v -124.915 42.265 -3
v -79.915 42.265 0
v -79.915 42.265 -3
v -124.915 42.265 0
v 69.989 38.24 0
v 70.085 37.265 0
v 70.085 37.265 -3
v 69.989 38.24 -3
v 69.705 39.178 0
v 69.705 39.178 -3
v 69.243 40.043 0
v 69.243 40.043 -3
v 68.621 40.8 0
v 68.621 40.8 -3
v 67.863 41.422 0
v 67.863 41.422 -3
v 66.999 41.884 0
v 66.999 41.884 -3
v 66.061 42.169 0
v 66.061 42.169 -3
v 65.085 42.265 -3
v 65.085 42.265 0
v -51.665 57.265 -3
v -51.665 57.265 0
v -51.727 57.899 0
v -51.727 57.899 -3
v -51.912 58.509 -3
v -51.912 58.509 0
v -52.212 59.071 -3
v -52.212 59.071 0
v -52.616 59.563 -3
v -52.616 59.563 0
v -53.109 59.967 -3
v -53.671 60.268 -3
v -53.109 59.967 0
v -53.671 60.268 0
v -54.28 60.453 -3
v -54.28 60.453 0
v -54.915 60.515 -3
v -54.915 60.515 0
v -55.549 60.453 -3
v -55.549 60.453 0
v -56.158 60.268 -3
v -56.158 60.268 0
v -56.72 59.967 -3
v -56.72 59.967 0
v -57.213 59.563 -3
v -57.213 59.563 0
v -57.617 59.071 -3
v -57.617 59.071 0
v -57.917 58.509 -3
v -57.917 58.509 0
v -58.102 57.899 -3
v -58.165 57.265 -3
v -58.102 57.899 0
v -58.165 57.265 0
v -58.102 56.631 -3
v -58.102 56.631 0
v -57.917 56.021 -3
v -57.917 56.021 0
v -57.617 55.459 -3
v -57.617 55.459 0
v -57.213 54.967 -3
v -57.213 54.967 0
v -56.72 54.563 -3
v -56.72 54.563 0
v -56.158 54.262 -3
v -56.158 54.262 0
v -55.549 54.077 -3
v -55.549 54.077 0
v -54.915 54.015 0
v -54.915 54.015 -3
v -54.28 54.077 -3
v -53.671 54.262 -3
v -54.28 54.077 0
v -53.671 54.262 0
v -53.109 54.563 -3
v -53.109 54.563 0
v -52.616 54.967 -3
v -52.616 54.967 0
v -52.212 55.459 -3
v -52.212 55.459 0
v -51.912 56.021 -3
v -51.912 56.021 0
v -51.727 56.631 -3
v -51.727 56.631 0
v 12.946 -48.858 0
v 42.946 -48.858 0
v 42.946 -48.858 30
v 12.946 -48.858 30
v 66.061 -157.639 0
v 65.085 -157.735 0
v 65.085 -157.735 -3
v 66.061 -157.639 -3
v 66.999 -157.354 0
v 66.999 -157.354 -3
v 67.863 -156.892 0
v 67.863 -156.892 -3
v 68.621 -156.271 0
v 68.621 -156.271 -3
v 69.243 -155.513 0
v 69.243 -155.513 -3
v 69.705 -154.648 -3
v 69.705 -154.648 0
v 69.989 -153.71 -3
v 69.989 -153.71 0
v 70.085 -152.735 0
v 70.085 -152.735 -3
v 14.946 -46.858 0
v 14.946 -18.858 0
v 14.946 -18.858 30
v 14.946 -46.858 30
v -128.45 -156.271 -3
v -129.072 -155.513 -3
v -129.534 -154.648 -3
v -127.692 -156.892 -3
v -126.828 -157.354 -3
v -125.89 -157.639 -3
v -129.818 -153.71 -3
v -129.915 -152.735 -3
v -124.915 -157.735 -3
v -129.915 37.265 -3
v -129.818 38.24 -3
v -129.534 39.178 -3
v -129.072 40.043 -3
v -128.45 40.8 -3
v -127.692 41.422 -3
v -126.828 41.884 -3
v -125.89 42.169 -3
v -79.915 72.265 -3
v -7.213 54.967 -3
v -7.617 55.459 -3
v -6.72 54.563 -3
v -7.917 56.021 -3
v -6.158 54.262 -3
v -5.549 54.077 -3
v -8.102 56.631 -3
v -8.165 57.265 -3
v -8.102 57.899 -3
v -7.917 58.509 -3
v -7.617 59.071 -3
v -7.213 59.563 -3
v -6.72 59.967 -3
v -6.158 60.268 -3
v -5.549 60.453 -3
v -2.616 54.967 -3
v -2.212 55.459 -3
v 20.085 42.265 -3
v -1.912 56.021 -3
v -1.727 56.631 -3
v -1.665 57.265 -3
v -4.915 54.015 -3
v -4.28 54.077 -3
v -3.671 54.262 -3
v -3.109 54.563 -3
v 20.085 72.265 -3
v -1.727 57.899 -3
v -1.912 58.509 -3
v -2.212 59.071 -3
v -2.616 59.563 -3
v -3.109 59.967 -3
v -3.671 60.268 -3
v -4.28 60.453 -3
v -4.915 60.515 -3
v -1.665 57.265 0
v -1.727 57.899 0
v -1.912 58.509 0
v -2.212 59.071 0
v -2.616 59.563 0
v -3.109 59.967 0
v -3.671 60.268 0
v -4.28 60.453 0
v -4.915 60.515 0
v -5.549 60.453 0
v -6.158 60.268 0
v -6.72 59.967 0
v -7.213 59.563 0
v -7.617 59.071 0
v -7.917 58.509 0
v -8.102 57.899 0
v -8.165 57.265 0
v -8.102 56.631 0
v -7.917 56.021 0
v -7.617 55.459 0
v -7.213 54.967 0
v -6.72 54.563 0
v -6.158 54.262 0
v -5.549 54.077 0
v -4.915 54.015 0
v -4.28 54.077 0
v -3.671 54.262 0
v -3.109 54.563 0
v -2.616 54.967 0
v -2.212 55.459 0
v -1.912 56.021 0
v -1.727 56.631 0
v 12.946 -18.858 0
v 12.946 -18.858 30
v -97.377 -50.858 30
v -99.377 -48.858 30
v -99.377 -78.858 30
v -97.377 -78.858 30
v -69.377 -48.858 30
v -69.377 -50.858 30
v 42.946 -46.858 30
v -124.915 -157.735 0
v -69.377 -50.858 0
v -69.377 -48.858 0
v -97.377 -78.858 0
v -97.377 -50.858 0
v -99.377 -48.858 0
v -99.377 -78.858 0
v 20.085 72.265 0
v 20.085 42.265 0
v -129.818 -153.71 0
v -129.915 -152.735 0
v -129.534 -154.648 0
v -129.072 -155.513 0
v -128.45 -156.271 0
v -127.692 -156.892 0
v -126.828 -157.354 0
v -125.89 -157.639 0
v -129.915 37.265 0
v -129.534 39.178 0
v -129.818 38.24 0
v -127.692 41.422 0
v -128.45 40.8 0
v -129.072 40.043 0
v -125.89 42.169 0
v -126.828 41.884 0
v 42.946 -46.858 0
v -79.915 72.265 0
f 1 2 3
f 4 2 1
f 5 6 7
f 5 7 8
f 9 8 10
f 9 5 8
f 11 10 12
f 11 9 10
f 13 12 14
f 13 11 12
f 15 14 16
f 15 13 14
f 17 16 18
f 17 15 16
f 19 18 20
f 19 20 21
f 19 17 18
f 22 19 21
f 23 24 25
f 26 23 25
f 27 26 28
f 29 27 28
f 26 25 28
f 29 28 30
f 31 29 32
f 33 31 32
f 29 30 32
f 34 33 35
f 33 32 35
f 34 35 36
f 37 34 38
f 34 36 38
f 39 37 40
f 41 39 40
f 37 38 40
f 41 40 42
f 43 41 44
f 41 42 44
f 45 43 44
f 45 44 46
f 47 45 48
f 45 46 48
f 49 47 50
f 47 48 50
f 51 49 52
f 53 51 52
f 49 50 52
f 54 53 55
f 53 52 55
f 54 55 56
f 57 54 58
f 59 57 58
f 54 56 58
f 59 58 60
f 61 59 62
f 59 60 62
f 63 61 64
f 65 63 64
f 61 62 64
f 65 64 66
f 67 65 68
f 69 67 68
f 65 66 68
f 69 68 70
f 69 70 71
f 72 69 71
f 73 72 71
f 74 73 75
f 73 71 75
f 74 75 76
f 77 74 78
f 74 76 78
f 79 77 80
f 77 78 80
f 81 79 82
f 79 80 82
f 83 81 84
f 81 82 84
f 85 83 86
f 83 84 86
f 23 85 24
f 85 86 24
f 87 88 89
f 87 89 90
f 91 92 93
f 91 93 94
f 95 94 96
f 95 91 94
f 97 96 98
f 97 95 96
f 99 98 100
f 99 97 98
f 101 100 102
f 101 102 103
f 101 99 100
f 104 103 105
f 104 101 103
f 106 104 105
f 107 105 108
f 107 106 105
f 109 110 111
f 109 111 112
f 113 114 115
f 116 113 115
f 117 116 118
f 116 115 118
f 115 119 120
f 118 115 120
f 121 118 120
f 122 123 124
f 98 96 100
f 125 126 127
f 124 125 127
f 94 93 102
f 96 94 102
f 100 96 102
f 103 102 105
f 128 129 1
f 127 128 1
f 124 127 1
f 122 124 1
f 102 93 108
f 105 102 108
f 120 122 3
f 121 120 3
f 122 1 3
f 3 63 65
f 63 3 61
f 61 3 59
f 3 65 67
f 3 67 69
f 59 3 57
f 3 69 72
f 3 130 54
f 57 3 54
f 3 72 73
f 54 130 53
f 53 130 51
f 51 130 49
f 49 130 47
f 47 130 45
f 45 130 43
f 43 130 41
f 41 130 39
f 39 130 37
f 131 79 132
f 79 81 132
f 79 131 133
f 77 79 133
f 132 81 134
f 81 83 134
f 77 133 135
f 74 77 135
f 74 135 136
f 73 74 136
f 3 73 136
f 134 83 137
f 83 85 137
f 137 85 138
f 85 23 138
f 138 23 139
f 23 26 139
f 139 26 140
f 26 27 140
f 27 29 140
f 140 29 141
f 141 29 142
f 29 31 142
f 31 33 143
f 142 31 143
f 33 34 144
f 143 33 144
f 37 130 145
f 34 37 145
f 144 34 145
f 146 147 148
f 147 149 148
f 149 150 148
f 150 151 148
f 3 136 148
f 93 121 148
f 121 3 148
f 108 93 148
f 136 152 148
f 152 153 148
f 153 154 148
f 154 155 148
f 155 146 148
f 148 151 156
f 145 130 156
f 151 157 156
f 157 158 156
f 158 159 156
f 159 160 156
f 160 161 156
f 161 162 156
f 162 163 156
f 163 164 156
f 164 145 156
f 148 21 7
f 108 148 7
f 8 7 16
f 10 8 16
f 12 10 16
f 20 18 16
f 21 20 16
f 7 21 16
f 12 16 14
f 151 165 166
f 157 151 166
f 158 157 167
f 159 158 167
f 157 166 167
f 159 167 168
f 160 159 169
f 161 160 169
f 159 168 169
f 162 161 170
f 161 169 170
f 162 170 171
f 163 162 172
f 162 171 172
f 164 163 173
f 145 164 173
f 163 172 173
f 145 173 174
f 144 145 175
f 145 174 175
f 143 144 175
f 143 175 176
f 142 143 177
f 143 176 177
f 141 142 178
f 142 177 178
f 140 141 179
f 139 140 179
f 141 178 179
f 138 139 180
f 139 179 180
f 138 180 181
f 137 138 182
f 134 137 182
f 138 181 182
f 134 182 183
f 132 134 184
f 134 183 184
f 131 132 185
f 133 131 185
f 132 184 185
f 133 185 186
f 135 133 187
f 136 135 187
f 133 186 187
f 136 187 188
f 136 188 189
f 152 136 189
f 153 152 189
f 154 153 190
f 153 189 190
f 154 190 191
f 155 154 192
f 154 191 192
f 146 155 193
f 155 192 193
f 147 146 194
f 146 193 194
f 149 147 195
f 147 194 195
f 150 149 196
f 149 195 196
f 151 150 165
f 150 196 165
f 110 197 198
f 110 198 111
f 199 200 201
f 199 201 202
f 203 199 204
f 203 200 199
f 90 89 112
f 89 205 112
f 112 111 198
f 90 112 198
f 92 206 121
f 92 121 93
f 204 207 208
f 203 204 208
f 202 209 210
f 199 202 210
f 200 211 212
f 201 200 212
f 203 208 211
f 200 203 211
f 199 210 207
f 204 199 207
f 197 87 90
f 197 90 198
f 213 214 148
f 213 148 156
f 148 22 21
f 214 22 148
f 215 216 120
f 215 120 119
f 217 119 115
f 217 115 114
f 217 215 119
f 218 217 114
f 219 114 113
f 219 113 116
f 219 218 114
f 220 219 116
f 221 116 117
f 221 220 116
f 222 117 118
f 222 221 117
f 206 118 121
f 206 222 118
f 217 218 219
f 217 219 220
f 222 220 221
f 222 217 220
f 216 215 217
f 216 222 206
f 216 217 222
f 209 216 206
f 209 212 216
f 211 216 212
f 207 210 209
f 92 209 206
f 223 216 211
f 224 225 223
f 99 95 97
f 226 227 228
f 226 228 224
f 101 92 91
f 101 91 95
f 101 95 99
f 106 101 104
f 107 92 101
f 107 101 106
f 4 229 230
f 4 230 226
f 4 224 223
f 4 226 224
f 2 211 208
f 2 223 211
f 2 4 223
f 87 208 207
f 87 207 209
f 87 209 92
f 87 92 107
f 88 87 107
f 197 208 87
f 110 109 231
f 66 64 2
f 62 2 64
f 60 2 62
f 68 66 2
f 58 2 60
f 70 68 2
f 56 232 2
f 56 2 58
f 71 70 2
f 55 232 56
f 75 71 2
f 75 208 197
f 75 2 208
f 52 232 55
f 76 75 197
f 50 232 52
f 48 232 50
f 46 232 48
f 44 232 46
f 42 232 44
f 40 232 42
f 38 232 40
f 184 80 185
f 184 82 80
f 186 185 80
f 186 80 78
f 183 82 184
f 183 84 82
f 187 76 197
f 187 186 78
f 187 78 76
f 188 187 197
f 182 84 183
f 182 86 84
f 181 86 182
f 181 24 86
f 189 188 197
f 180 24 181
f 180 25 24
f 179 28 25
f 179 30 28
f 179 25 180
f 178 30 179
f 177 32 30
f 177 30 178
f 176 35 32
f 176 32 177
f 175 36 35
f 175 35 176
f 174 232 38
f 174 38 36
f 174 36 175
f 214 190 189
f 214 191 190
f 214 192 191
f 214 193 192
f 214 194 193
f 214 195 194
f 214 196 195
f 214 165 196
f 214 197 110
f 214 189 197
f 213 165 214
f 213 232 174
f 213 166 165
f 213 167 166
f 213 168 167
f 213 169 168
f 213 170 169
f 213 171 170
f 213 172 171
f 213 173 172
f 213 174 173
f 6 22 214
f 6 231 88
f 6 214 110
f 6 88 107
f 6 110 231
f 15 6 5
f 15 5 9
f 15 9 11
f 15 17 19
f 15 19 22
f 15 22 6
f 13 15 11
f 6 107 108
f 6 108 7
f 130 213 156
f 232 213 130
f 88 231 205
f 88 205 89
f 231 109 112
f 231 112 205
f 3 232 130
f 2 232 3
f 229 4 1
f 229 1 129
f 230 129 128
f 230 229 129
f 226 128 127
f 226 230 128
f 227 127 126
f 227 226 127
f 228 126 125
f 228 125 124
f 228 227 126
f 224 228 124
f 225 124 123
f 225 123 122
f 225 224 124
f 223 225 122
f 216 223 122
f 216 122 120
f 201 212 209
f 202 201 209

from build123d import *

# Parameters (mm, degrees)
SKETCH1_R           = 3.25
BASE_FLANGE1_DEPTH  = 3
BOSS_EXTRUDE1_DEPTH = 30


# Sheet-metal steps are written as plain solids
with BuildPart() as part:
    # Sketch1 → Base-Flange1 (new body)
    with BuildSketch(Plane.XY):
        with BuildLine():
            Line((-79.914529915, 72.264957265), (-79.914529915, 42.264957265))
            Line((-79.914529915, 42.264957265), (-124.914529915, 42.264957265))
            ThreePointArc((-124.914529915, 42.264957265), (-128.45006382, 40.800491171), (-129.914529915, 37.264957265))
            Line((-129.914529915, 37.264957265), (-129.914529915, -152.735042735))
            ThreePointArc((-129.914529915, -152.735042735), (-128.45006382, -156.270576641), (-124.914529915, -157.735042735))
            Line((-124.914529915, -157.735042735), (65.085470085, -157.735042735))
            ThreePointArc((65.085470085, -157.735042735), (68.621003991, -156.270576641), (70.085470085, -152.735042735))
            Line((70.085470085, -152.735042735), (70.085470085, 37.264957265))
            ThreePointArc((70.085470085, 37.264957265), (68.621003991, 40.800491171), (65.085470085, 42.264957265))
            Line((65.085470085, 42.264957265), (20.085470085, 42.264957265))
            Line((20.085470085, 42.264957265), (20.085470085, 72.264957265))
            Line((20.085470085, 72.264957265), (-79.914529915, 72.264957265))
        make_face()
        with Locations((-4.914529915, 57.264957265)):
            Circle(SKETCH1_R, mode=Mode.SUBTRACT)
        with Locations((-54.914529915, 57.264957265)):
            Circle(SKETCH1_R, mode=Mode.SUBTRACT)
    extrude(amount=-BASE_FLANGE1_DEPTH)

    # Sketch2 → Boss-Extrude1 (add)
    with BuildSketch(Plane.XY):
        Polygon((42.945575149, -48.857914887), (12.945575149, -48.857914887), (12.945575149, -18.857914887), (14.945575149, -18.857914887), (14.945575149, -46.857914887), (42.945575149, -46.857914887), align=None)
        Polygon((-69.377458811, -48.857914887), (-99.377458811, -48.857914887), (-99.377458811, -78.857914887), (-97.377458811, -78.857914887), (-97.377458811, -50.857914887), (-69.377458811, -50.857914887), align=None)
    extrude(amount=BOSS_EXTRUDE1_DEPTH)


solid = part.part
